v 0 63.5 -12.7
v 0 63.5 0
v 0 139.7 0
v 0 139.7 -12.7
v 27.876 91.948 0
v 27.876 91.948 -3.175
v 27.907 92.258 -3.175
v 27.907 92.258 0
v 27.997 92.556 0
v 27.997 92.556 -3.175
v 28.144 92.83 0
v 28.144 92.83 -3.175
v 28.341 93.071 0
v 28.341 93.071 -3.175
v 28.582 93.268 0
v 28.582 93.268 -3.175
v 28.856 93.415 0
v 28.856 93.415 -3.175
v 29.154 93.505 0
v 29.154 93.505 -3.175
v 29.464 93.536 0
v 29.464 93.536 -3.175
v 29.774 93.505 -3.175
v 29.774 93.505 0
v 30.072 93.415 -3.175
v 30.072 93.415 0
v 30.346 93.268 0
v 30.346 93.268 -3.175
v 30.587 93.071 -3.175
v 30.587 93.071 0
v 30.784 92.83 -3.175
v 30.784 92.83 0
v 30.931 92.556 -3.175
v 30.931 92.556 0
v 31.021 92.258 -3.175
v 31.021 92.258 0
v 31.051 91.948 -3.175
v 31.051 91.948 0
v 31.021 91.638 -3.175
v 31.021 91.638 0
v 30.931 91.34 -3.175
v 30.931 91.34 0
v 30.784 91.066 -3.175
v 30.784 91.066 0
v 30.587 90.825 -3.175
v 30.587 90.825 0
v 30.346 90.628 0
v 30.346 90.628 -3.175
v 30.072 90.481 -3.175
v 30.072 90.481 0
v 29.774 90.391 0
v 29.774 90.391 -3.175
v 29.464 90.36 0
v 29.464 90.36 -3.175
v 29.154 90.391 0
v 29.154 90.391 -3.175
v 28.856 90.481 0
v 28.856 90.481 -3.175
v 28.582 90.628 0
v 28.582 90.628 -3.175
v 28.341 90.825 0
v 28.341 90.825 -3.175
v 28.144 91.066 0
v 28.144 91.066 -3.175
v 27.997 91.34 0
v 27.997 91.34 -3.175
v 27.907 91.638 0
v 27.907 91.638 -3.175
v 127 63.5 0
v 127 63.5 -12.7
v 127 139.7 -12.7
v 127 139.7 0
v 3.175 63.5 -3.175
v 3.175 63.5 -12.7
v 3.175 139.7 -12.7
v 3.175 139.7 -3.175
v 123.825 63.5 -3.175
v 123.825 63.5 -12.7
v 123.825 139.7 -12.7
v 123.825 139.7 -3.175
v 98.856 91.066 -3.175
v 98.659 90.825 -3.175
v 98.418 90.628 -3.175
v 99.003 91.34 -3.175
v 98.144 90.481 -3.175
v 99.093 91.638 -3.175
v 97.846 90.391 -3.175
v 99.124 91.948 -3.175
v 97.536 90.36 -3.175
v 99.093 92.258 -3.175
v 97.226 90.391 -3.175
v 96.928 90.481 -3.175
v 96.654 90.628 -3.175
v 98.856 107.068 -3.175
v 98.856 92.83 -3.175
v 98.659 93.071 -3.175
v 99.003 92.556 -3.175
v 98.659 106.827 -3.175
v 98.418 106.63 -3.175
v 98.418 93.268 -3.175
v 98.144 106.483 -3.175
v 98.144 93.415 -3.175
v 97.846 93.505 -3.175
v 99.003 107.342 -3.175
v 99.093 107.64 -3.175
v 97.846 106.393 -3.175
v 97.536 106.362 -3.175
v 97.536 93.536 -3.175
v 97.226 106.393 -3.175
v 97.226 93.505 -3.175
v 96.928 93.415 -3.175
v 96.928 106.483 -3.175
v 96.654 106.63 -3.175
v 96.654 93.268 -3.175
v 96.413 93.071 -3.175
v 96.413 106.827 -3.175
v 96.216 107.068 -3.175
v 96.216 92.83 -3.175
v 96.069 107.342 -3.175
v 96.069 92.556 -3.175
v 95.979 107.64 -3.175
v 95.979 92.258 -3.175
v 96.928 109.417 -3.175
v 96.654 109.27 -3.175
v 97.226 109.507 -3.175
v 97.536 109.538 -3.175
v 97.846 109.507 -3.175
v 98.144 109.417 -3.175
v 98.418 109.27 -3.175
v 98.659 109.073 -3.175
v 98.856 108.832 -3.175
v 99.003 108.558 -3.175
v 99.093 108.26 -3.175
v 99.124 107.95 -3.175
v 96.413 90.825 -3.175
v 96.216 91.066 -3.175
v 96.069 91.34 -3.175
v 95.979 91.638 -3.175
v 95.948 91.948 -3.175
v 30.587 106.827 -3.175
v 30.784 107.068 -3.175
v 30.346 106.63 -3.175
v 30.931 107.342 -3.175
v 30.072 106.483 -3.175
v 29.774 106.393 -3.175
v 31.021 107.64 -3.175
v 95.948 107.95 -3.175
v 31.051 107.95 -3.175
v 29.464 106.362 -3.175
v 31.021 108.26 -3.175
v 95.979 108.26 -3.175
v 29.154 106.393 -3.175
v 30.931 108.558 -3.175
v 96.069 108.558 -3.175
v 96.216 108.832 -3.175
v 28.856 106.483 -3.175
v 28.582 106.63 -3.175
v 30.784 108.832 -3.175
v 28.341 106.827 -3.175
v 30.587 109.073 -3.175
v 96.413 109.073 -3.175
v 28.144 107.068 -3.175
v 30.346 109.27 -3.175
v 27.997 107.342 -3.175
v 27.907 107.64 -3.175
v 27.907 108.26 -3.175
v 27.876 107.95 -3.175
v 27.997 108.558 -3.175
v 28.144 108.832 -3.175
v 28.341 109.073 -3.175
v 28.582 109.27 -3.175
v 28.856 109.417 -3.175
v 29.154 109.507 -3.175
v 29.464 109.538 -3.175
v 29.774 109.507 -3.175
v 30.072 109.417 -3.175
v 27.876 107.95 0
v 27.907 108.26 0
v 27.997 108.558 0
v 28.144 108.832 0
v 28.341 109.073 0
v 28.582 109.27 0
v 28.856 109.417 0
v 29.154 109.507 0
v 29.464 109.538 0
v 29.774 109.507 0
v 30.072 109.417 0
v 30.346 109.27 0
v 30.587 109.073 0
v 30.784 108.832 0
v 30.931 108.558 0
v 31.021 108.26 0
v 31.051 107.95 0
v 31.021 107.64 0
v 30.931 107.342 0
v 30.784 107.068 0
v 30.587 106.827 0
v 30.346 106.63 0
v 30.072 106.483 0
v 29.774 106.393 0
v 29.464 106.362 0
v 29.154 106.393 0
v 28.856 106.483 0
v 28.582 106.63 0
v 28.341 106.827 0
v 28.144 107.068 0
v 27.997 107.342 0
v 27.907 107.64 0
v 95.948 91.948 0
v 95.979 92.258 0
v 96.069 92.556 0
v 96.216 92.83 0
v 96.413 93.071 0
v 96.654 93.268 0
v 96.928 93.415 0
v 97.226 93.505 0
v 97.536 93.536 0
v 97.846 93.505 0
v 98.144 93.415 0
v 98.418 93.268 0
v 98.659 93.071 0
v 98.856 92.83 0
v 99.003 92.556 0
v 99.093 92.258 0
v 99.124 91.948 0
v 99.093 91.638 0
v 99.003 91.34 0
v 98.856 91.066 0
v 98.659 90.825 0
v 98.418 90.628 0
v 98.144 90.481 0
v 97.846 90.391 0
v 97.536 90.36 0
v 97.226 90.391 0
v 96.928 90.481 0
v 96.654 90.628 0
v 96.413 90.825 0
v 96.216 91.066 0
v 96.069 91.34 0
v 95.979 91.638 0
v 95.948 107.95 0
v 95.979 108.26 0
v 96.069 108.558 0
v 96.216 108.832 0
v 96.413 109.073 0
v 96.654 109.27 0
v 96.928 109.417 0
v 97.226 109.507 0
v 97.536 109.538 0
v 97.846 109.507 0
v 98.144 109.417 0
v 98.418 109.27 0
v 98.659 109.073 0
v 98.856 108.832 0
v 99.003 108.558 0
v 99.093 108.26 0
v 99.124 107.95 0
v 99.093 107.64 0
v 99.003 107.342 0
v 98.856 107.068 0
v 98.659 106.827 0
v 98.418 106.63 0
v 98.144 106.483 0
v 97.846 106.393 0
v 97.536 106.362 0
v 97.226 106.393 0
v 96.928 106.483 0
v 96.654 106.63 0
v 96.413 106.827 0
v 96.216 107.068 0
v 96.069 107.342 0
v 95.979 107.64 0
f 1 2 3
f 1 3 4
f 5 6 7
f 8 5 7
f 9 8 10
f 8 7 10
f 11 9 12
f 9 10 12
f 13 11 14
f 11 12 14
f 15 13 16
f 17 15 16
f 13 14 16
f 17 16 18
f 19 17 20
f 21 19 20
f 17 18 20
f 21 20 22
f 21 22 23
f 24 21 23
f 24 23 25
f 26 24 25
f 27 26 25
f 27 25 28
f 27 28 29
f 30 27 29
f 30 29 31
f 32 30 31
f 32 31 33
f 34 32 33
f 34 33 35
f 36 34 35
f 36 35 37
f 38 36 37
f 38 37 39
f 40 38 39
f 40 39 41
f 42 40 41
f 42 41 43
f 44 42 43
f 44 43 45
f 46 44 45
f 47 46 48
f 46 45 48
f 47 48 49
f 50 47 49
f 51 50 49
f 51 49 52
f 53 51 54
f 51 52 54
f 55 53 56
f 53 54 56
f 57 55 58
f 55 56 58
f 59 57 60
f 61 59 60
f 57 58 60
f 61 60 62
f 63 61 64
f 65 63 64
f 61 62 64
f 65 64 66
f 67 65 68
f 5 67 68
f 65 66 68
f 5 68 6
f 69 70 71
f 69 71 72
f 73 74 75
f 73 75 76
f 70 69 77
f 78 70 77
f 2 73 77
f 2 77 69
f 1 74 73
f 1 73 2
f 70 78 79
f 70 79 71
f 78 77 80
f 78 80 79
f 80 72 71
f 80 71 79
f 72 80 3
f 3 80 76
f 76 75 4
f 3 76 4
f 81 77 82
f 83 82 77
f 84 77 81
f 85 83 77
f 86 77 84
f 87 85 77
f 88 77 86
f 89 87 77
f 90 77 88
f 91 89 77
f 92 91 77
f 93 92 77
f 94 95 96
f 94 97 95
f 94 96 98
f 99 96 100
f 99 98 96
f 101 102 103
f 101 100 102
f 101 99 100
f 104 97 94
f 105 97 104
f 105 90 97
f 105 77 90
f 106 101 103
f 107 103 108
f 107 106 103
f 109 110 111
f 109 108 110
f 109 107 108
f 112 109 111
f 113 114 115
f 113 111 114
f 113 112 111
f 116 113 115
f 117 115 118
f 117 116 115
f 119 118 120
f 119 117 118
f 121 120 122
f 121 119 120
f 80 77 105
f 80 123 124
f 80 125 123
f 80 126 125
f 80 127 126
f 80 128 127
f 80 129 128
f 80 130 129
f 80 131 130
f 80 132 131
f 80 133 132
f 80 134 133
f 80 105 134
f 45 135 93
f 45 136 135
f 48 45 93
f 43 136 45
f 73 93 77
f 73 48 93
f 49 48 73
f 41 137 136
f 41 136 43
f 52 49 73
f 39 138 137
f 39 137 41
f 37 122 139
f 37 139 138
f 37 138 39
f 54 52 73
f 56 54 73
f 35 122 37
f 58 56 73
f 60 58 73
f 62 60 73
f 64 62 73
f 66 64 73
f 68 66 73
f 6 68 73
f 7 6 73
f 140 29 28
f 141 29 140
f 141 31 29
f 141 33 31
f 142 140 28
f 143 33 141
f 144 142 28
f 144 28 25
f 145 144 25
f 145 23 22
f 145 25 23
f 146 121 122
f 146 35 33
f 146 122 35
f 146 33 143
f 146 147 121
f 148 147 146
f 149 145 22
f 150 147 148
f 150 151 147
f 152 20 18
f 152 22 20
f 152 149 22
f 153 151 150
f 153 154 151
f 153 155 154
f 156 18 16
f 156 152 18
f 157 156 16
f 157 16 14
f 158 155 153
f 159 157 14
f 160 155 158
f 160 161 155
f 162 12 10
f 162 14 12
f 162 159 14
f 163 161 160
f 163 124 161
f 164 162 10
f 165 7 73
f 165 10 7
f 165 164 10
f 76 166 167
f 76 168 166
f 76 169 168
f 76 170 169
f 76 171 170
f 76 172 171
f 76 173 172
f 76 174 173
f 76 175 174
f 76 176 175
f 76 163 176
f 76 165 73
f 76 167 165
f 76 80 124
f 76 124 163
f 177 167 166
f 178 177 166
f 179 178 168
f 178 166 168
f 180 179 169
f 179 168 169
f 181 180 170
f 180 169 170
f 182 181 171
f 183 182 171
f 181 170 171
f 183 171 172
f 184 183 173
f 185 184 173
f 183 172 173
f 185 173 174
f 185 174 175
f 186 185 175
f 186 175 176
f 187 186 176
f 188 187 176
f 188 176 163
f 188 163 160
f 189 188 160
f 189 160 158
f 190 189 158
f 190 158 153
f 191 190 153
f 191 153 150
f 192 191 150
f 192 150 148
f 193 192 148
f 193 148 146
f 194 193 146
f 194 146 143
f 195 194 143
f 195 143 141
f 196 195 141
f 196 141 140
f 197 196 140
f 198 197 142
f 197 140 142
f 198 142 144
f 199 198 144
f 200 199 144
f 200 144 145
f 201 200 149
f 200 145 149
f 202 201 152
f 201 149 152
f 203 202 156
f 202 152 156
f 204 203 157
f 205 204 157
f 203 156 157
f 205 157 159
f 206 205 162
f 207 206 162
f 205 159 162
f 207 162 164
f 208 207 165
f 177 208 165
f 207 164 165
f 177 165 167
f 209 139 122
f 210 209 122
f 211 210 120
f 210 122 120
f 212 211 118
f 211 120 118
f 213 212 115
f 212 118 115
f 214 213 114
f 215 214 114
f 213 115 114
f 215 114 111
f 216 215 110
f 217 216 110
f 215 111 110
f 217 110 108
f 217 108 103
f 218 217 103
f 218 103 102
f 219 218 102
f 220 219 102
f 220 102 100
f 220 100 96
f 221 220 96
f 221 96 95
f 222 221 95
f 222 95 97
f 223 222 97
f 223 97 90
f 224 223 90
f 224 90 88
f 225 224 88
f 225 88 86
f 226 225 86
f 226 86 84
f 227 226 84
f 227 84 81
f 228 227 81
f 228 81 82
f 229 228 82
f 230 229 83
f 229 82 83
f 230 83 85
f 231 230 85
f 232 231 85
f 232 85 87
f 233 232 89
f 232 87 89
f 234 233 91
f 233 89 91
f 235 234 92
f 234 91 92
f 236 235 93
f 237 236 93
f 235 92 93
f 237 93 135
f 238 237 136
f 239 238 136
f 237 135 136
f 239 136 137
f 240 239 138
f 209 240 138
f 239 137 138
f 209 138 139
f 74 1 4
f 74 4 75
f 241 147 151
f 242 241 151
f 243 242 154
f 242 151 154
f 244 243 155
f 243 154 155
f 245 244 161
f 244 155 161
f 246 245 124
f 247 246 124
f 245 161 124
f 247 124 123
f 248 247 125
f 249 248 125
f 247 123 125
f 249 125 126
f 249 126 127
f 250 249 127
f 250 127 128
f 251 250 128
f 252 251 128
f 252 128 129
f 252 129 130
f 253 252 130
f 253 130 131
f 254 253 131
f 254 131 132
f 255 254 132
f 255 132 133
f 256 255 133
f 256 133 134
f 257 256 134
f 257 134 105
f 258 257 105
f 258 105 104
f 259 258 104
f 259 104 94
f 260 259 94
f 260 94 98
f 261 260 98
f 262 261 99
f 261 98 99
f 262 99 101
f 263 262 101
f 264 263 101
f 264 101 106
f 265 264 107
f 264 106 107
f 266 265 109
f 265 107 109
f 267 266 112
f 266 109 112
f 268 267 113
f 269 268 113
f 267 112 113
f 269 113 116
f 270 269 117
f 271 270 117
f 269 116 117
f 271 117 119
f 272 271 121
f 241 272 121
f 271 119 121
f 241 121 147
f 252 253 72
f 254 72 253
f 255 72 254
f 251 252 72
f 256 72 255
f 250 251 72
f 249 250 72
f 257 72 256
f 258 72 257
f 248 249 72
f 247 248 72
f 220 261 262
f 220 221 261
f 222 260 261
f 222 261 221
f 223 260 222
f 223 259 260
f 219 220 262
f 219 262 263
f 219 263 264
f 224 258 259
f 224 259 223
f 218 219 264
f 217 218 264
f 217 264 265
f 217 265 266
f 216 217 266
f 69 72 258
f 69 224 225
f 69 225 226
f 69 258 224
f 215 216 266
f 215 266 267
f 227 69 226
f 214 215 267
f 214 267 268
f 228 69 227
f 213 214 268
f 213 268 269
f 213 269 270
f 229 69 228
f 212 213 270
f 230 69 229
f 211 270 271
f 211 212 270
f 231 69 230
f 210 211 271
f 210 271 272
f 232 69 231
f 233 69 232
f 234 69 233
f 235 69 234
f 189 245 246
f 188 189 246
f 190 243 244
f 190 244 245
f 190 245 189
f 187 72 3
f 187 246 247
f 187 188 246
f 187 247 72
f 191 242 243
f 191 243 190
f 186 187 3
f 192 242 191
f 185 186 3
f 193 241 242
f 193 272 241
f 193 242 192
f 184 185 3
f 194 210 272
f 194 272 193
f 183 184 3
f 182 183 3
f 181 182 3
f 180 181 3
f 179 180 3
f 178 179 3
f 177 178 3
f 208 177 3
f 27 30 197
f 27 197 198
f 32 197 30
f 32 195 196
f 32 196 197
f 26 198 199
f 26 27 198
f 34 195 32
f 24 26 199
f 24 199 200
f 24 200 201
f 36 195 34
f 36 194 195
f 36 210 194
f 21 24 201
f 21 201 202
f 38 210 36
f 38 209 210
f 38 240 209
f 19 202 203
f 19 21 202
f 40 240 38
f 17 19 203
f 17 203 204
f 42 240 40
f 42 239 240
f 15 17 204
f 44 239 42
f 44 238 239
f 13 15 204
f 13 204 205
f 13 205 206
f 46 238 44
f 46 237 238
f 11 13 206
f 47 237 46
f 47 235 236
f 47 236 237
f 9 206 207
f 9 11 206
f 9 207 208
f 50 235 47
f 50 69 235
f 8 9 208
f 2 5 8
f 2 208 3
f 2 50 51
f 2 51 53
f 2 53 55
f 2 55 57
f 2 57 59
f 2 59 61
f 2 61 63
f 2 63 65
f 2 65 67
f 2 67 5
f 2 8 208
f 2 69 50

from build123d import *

# Parameters (mm, degrees)
BOSS_EXTRUDE1_DEPTH     = 139.7
SKETCH3_W               = 127
SKETCH3_H               = 63.5
SKETCH3_R               = 1.5875
CUT_EXTRUDE1_DEPTH      = 10.525
CUT_EXTRUDE1_DEPTH_BACK = 4.175


with BuildPart() as part:
    # Sketch2 → Boss-Extrude1 (new body)
    with BuildSketch(Plane(origin=(0, 0, 0), x_dir=(1, 0, 0), z_dir=(0, 1, 0))):
        Polygon((0, 0), (0, 12.7), (3.175, 12.7), (3.175, 3.175), (123.825, 3.175), (123.825, 12.7), (127, 12.7), (127, 0), align=None)
    extrude(amount=BOSS_EXTRUDE1_DEPTH)

    # Sketch3 → Cut-Extrude1 (cut, two sides)
    with BuildSketch(Plane(origin=(0, 0, -3.175), x_dir=(-1, 0, 0), z_dir=(0, 0, -1))) as cut_extrude1_sk:
        with Locations((-63.5, 31.75)):
            Rectangle(SKETCH3_W, SKETCH3_H)
        with Locations((-97.536, 107.95)):
            Circle(SKETCH3_R)
        with Locations((-29.464, 107.95)):
            Circle(SKETCH3_R)
        with Locations((-29.464, 91.948)):
            Circle(SKETCH3_R)
        with Locations((-97.536, 91.948)):
            Circle(SKETCH3_R)
    extrude(amount=CUT_EXTRUDE1_DEPTH, mode=Mode.SUBTRACT)
    extrude(cut_extrude1_sk.sketch, amount=-CUT_EXTRUDE1_DEPTH_BACK, mode=Mode.SUBTRACT)


solid = part.part
